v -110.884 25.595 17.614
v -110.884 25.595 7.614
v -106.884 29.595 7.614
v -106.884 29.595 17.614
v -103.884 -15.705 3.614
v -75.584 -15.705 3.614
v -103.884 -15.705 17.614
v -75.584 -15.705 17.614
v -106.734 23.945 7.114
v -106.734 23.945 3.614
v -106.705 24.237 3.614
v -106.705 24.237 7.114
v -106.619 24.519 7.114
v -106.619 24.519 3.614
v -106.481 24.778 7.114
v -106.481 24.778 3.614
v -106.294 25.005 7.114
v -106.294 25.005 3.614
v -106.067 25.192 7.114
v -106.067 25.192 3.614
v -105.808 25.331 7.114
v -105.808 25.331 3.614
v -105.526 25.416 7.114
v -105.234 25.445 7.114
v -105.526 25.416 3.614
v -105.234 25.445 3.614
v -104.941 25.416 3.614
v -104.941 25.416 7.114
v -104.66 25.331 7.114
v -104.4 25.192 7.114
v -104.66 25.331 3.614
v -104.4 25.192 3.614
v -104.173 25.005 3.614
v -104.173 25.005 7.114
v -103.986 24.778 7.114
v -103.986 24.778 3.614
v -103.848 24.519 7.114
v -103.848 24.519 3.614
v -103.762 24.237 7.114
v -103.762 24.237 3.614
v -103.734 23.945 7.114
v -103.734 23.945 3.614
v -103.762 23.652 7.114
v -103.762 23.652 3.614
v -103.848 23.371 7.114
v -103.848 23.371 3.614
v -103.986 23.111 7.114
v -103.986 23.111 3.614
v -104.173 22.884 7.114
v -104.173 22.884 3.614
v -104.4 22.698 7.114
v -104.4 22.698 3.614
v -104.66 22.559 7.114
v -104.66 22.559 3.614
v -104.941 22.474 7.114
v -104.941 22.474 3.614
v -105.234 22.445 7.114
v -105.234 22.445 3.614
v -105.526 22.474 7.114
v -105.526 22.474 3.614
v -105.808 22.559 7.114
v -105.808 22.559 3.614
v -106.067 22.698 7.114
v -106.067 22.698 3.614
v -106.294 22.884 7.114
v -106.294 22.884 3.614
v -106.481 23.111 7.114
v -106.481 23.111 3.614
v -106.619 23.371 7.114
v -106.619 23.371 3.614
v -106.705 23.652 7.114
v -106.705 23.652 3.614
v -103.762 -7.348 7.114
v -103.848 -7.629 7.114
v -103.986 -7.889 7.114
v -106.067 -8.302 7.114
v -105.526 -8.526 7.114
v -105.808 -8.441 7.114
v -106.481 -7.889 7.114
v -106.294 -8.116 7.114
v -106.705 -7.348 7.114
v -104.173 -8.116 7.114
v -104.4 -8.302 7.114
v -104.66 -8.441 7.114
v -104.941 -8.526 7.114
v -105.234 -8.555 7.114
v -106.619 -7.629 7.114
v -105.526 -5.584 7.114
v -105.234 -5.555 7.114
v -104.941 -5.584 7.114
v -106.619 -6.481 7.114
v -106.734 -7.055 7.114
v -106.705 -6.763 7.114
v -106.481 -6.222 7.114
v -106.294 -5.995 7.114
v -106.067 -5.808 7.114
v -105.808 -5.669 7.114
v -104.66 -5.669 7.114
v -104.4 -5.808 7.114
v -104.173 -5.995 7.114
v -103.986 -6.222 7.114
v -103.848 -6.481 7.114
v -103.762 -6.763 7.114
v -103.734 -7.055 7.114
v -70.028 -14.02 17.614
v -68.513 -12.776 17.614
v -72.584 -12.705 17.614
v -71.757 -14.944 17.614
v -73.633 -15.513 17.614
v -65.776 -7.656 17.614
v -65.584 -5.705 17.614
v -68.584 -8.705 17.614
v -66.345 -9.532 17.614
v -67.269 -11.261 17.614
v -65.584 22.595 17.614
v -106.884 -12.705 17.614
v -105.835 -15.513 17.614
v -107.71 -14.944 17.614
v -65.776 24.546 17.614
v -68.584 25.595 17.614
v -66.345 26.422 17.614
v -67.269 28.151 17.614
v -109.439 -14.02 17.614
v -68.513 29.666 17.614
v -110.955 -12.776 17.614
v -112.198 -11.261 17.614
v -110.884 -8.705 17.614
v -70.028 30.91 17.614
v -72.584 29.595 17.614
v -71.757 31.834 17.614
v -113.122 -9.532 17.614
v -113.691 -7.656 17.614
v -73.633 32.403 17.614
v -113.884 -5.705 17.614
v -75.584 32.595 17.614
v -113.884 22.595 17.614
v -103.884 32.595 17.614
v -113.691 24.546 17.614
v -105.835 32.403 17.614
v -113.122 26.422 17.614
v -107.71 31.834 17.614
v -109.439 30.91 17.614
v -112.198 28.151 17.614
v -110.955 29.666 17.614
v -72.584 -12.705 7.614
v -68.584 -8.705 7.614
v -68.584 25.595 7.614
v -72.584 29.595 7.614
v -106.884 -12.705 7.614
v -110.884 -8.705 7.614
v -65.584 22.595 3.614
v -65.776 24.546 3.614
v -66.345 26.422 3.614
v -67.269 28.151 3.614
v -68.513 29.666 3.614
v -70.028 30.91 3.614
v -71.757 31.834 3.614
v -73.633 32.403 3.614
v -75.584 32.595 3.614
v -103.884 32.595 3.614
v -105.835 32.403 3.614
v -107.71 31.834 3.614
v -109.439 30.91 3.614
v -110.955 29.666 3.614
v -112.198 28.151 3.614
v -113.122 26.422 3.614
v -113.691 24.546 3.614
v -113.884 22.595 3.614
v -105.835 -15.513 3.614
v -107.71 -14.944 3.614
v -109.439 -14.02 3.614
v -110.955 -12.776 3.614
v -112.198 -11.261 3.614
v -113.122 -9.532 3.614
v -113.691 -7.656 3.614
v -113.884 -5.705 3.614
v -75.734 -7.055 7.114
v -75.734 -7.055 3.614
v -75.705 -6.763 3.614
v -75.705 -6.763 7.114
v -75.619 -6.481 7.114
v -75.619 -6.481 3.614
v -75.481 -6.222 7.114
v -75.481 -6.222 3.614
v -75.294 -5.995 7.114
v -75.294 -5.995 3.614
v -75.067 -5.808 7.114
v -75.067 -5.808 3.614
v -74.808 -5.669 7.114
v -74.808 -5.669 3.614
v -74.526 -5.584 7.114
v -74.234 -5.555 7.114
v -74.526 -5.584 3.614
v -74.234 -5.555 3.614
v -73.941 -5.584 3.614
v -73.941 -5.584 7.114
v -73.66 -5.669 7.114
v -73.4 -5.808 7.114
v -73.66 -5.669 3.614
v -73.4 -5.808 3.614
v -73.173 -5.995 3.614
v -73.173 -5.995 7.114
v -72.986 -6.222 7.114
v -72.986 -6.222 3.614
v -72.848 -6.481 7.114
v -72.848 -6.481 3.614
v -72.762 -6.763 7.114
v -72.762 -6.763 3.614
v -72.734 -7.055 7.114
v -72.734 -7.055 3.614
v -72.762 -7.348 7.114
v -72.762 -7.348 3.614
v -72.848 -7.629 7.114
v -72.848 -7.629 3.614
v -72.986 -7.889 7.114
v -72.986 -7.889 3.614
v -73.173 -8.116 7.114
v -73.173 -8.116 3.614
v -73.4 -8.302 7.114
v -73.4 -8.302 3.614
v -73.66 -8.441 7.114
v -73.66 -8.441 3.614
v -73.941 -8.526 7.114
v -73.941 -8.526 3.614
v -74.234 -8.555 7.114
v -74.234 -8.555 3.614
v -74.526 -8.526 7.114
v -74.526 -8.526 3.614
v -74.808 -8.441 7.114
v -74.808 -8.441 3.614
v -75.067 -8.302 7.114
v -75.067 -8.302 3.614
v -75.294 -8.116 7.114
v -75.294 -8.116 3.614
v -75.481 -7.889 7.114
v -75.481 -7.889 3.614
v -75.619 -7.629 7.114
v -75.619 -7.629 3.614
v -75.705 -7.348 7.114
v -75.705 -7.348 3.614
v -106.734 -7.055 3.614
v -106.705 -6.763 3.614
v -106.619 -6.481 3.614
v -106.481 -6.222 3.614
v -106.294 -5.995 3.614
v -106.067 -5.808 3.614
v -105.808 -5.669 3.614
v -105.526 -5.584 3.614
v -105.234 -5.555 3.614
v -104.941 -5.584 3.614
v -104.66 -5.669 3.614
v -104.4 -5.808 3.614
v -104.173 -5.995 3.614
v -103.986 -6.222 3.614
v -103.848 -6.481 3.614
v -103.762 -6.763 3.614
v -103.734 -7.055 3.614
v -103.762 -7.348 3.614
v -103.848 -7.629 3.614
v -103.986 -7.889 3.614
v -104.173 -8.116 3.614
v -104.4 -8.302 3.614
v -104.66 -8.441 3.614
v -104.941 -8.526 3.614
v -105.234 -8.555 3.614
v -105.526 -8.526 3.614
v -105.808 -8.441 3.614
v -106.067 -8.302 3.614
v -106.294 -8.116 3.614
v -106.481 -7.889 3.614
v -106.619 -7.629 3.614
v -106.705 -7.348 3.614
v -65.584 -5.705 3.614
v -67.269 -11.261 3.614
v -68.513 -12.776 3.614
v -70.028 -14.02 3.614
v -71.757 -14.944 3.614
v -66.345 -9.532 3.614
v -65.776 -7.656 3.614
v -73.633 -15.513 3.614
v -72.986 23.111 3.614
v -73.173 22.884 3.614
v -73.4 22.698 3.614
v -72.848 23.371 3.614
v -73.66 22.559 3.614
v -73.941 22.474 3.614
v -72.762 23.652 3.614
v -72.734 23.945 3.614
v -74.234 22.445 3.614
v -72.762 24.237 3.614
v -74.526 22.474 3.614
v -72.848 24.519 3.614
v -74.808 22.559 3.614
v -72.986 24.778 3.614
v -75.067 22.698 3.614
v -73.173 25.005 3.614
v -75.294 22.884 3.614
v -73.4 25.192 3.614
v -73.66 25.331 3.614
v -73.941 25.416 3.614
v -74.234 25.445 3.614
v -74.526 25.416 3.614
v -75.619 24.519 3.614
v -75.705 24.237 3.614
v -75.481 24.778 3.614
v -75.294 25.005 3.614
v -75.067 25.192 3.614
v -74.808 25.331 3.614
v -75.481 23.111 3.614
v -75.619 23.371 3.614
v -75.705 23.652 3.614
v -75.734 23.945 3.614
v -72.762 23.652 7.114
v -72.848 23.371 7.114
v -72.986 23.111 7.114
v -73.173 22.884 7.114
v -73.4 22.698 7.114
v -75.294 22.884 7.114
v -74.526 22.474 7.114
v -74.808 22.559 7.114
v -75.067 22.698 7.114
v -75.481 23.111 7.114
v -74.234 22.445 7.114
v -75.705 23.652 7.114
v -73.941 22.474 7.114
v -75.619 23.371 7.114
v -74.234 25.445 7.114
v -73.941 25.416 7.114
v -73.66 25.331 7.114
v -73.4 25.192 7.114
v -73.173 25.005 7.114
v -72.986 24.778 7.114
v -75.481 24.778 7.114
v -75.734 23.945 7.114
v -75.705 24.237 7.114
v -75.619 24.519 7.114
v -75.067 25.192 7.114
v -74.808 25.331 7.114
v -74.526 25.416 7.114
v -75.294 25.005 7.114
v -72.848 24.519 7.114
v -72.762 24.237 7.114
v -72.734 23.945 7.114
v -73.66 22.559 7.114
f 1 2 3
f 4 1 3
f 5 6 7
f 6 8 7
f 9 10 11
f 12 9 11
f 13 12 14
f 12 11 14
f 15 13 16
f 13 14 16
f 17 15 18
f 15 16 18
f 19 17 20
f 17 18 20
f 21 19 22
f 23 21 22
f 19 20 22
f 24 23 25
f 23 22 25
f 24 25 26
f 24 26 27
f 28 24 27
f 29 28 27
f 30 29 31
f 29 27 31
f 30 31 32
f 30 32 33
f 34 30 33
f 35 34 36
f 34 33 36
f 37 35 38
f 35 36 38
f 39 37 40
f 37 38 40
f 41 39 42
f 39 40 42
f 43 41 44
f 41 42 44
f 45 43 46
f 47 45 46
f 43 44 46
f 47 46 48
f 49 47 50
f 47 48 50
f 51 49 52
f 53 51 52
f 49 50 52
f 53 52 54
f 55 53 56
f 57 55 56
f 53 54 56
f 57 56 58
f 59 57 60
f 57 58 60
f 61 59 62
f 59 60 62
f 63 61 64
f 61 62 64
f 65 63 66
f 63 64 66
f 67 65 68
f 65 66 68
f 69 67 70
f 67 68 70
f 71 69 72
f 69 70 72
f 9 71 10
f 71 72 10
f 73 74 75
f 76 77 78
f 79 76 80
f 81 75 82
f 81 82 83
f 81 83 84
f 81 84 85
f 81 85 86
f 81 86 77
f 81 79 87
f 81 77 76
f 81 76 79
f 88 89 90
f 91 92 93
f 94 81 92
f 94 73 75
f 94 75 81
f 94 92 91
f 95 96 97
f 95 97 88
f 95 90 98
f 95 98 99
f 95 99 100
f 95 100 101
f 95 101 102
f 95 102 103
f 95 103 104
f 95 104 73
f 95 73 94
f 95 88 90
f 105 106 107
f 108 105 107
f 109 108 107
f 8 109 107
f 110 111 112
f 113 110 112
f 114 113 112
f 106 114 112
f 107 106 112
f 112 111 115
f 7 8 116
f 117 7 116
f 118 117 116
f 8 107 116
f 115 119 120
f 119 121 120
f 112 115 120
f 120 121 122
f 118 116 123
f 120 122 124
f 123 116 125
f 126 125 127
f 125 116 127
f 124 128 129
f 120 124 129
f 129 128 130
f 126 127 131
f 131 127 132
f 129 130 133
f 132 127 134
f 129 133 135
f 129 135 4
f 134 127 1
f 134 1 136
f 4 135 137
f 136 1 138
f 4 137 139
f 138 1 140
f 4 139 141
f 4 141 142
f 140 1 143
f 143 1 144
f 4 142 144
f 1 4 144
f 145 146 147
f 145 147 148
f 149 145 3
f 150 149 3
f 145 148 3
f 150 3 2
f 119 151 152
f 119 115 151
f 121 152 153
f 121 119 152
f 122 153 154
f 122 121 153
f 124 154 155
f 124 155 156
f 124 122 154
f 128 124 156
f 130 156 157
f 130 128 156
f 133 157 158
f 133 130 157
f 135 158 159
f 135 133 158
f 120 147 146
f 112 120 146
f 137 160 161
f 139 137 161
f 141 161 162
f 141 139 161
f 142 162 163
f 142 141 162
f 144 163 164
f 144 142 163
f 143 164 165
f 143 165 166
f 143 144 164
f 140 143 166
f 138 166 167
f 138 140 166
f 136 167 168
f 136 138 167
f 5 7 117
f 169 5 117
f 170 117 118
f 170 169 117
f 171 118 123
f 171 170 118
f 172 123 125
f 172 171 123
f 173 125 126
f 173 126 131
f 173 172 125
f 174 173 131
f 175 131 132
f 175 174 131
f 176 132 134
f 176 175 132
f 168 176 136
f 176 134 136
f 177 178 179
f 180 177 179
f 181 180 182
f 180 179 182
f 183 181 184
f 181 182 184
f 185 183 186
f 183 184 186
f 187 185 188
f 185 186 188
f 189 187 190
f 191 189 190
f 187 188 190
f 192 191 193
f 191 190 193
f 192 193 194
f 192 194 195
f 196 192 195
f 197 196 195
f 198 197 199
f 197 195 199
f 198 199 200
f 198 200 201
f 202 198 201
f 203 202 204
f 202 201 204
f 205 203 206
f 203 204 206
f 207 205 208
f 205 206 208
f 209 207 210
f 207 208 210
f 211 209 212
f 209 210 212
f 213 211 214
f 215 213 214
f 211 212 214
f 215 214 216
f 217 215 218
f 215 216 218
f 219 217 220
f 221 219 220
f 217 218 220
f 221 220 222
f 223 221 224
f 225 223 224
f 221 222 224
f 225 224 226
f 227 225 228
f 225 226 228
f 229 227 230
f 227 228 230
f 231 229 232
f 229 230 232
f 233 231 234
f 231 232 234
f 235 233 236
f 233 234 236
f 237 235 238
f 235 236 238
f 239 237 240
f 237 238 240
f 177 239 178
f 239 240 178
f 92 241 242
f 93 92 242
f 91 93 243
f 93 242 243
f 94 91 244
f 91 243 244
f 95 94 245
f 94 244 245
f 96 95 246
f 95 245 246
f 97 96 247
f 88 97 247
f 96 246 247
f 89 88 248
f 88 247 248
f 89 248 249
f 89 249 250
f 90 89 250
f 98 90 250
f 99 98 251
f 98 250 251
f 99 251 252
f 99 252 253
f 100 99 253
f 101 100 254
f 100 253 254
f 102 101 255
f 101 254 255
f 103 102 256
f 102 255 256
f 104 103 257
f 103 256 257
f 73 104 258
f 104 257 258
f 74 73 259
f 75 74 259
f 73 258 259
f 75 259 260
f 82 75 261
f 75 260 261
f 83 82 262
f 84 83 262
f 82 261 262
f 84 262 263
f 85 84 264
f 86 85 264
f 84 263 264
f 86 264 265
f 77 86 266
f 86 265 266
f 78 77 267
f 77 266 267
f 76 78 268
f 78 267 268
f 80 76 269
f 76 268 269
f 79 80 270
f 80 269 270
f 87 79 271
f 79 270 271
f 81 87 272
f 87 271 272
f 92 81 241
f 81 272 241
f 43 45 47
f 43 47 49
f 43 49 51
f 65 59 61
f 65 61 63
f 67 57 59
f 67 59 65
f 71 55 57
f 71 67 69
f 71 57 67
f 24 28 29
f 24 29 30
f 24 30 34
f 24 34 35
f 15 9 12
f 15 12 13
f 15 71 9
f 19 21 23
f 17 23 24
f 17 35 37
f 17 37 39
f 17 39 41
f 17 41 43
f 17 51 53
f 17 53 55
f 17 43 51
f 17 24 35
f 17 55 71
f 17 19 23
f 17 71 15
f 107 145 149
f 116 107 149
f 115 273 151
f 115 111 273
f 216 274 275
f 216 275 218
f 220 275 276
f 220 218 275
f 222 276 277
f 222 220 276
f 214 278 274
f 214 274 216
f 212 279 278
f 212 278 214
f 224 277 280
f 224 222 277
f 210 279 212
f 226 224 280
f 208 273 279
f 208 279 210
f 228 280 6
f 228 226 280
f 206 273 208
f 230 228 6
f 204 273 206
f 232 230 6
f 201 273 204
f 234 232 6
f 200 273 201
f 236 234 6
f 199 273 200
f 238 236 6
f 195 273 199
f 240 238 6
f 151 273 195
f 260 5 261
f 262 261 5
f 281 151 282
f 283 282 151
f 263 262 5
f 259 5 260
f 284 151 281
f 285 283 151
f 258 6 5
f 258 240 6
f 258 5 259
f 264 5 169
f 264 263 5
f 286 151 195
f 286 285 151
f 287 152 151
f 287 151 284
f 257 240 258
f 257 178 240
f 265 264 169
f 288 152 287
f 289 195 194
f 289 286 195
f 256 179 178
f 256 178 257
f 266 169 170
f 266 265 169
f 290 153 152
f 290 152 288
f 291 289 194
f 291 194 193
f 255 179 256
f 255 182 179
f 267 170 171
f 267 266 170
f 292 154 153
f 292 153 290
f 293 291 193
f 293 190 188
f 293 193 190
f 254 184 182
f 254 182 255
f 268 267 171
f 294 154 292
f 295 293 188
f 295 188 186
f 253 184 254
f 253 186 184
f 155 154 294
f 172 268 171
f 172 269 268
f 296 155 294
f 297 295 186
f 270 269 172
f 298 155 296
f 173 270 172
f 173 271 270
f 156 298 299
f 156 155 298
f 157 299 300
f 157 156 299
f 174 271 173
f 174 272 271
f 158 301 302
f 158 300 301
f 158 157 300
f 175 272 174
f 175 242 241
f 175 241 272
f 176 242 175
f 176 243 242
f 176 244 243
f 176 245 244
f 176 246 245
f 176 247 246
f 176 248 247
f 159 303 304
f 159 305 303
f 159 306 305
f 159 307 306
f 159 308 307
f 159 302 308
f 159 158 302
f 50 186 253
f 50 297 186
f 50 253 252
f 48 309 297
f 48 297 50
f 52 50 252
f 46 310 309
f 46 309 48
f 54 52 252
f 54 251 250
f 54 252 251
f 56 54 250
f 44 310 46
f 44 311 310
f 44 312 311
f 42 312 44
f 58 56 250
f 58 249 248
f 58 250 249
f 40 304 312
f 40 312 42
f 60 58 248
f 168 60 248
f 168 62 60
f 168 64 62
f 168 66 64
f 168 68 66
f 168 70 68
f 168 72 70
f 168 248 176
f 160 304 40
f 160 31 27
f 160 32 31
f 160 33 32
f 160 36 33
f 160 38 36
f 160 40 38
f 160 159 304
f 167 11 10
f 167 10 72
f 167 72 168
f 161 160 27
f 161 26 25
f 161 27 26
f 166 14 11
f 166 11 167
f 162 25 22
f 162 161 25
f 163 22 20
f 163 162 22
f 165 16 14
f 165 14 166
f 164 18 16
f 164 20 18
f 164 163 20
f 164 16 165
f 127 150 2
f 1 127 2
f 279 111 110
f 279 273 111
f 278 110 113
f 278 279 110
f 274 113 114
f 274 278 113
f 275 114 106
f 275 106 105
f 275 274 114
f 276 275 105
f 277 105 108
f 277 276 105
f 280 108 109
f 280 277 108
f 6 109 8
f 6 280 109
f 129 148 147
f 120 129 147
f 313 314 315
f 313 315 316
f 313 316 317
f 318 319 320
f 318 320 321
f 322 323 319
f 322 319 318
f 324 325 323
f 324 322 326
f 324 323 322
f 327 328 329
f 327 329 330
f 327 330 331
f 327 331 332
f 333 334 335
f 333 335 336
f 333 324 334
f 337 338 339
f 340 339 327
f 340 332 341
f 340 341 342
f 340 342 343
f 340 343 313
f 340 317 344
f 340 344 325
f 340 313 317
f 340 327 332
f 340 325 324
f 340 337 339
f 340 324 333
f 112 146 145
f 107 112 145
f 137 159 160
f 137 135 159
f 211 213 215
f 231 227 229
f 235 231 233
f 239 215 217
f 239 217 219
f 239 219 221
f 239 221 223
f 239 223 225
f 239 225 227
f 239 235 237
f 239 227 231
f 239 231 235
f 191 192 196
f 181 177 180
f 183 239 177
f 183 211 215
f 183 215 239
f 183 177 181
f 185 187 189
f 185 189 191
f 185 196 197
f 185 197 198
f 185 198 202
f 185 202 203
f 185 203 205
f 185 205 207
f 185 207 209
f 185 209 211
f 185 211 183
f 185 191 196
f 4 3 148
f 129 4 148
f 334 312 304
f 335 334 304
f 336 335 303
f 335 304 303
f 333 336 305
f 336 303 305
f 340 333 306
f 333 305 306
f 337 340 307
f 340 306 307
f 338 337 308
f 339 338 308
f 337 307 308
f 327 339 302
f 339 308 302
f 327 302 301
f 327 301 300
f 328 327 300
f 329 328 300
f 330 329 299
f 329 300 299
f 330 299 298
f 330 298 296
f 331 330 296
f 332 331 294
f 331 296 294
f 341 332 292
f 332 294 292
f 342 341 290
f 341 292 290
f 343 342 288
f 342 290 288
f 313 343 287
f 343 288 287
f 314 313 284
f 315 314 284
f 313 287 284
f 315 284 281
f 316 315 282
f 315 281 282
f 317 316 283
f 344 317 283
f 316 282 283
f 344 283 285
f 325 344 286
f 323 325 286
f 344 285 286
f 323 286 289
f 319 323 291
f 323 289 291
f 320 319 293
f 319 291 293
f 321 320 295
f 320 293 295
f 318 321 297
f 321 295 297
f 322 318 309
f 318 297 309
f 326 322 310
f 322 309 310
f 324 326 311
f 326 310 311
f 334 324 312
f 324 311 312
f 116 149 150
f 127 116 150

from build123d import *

# Parameters (mm, degrees)
SKETCH1_W           = 48.3
SKETCH1_H           = 48.3
BOSS_EXTRUDE1_DEPTH = 10
SKETCH1_3_W         = 48.3
SKETCH1_3_H         = 48.3
BOSS_EXTRUDE2_DEPTH = 4
SKETCH2_R           = 1.5
CUT_EXTRUDE1_DEPTH  = 3.5
FILLET1_R           = 10


with BuildPart() as part:
    # Sketch1 → Boss-Extrude1 (new body)
    with BuildSketch(Plane(origin=(0, 0, 7.613932461), x_dir=(-1, 0, 0), z_dir=(0, 0, -1))):
        with Locations((89.733633233, 8.444815184)):
            Rectangle(SKETCH1_W, SKETCH1_H)
        Polygon((110.883633233, 25.594815184), (110.883633233, -8.705184816), (106.883633233, -12.705184816), (72.583633233, -12.705184816), (68.583633233, -8.705184816), (68.583633233, 25.594815184), (72.583633233, 29.594815184), (106.883633233, 29.594815184), align=None, mode=Mode.SUBTRACT)
    extrude(amount=-BOSS_EXTRUDE1_DEPTH)

    # Sketch1<3> → Boss-Extrude2 (add)
    with BuildSketch(Plane(origin=(0, 0, 7.613932461), x_dir=(-1, 0, 0), z_dir=(0, 0, -1))):
        with Locations((89.733633233, 8.444815184)):
            Rectangle(SKETCH1_3_W, SKETCH1_3_H)
    extrude(amount=BOSS_EXTRUDE2_DEPTH)

    # Sketch2 → Cut-Extrude1 (cut)
    with BuildSketch(Plane(origin=(0, 0, 3.613932461), x_dir=(-1, 0, 0), z_dir=(0, 0, -1))):
        with Locations((105.233633233, 23.944815184)):
            Circle(SKETCH2_R)
        with Locations((105.233633233, -7.055184816)):
            Circle(SKETCH2_R)
        with Locations((74.233633233, -7.055184816)):
            Circle(SKETCH2_R)
        with Locations((74.233633233, 23.944815184)):
            Circle(SKETCH2_R)
    extrude(amount=-CUT_EXTRUDE1_DEPTH, mode=Mode.SUBTRACT)

    # Fillet1
    fillet1_edges = [part.edges().sort_by_distance(p)[0] for p in [
        (-113.883633233, 32.594815184, 10.613932461),
        (-113.883633233, -15.705184816, 10.613932461),
        (-65.583633233, -15.705184816, 10.613932461),
        (-65.583633233, 32.594815184, 10.613932461),
    ]]
    fillet(fillet1_edges, radius=FILLET1_R)


solid = part.part
